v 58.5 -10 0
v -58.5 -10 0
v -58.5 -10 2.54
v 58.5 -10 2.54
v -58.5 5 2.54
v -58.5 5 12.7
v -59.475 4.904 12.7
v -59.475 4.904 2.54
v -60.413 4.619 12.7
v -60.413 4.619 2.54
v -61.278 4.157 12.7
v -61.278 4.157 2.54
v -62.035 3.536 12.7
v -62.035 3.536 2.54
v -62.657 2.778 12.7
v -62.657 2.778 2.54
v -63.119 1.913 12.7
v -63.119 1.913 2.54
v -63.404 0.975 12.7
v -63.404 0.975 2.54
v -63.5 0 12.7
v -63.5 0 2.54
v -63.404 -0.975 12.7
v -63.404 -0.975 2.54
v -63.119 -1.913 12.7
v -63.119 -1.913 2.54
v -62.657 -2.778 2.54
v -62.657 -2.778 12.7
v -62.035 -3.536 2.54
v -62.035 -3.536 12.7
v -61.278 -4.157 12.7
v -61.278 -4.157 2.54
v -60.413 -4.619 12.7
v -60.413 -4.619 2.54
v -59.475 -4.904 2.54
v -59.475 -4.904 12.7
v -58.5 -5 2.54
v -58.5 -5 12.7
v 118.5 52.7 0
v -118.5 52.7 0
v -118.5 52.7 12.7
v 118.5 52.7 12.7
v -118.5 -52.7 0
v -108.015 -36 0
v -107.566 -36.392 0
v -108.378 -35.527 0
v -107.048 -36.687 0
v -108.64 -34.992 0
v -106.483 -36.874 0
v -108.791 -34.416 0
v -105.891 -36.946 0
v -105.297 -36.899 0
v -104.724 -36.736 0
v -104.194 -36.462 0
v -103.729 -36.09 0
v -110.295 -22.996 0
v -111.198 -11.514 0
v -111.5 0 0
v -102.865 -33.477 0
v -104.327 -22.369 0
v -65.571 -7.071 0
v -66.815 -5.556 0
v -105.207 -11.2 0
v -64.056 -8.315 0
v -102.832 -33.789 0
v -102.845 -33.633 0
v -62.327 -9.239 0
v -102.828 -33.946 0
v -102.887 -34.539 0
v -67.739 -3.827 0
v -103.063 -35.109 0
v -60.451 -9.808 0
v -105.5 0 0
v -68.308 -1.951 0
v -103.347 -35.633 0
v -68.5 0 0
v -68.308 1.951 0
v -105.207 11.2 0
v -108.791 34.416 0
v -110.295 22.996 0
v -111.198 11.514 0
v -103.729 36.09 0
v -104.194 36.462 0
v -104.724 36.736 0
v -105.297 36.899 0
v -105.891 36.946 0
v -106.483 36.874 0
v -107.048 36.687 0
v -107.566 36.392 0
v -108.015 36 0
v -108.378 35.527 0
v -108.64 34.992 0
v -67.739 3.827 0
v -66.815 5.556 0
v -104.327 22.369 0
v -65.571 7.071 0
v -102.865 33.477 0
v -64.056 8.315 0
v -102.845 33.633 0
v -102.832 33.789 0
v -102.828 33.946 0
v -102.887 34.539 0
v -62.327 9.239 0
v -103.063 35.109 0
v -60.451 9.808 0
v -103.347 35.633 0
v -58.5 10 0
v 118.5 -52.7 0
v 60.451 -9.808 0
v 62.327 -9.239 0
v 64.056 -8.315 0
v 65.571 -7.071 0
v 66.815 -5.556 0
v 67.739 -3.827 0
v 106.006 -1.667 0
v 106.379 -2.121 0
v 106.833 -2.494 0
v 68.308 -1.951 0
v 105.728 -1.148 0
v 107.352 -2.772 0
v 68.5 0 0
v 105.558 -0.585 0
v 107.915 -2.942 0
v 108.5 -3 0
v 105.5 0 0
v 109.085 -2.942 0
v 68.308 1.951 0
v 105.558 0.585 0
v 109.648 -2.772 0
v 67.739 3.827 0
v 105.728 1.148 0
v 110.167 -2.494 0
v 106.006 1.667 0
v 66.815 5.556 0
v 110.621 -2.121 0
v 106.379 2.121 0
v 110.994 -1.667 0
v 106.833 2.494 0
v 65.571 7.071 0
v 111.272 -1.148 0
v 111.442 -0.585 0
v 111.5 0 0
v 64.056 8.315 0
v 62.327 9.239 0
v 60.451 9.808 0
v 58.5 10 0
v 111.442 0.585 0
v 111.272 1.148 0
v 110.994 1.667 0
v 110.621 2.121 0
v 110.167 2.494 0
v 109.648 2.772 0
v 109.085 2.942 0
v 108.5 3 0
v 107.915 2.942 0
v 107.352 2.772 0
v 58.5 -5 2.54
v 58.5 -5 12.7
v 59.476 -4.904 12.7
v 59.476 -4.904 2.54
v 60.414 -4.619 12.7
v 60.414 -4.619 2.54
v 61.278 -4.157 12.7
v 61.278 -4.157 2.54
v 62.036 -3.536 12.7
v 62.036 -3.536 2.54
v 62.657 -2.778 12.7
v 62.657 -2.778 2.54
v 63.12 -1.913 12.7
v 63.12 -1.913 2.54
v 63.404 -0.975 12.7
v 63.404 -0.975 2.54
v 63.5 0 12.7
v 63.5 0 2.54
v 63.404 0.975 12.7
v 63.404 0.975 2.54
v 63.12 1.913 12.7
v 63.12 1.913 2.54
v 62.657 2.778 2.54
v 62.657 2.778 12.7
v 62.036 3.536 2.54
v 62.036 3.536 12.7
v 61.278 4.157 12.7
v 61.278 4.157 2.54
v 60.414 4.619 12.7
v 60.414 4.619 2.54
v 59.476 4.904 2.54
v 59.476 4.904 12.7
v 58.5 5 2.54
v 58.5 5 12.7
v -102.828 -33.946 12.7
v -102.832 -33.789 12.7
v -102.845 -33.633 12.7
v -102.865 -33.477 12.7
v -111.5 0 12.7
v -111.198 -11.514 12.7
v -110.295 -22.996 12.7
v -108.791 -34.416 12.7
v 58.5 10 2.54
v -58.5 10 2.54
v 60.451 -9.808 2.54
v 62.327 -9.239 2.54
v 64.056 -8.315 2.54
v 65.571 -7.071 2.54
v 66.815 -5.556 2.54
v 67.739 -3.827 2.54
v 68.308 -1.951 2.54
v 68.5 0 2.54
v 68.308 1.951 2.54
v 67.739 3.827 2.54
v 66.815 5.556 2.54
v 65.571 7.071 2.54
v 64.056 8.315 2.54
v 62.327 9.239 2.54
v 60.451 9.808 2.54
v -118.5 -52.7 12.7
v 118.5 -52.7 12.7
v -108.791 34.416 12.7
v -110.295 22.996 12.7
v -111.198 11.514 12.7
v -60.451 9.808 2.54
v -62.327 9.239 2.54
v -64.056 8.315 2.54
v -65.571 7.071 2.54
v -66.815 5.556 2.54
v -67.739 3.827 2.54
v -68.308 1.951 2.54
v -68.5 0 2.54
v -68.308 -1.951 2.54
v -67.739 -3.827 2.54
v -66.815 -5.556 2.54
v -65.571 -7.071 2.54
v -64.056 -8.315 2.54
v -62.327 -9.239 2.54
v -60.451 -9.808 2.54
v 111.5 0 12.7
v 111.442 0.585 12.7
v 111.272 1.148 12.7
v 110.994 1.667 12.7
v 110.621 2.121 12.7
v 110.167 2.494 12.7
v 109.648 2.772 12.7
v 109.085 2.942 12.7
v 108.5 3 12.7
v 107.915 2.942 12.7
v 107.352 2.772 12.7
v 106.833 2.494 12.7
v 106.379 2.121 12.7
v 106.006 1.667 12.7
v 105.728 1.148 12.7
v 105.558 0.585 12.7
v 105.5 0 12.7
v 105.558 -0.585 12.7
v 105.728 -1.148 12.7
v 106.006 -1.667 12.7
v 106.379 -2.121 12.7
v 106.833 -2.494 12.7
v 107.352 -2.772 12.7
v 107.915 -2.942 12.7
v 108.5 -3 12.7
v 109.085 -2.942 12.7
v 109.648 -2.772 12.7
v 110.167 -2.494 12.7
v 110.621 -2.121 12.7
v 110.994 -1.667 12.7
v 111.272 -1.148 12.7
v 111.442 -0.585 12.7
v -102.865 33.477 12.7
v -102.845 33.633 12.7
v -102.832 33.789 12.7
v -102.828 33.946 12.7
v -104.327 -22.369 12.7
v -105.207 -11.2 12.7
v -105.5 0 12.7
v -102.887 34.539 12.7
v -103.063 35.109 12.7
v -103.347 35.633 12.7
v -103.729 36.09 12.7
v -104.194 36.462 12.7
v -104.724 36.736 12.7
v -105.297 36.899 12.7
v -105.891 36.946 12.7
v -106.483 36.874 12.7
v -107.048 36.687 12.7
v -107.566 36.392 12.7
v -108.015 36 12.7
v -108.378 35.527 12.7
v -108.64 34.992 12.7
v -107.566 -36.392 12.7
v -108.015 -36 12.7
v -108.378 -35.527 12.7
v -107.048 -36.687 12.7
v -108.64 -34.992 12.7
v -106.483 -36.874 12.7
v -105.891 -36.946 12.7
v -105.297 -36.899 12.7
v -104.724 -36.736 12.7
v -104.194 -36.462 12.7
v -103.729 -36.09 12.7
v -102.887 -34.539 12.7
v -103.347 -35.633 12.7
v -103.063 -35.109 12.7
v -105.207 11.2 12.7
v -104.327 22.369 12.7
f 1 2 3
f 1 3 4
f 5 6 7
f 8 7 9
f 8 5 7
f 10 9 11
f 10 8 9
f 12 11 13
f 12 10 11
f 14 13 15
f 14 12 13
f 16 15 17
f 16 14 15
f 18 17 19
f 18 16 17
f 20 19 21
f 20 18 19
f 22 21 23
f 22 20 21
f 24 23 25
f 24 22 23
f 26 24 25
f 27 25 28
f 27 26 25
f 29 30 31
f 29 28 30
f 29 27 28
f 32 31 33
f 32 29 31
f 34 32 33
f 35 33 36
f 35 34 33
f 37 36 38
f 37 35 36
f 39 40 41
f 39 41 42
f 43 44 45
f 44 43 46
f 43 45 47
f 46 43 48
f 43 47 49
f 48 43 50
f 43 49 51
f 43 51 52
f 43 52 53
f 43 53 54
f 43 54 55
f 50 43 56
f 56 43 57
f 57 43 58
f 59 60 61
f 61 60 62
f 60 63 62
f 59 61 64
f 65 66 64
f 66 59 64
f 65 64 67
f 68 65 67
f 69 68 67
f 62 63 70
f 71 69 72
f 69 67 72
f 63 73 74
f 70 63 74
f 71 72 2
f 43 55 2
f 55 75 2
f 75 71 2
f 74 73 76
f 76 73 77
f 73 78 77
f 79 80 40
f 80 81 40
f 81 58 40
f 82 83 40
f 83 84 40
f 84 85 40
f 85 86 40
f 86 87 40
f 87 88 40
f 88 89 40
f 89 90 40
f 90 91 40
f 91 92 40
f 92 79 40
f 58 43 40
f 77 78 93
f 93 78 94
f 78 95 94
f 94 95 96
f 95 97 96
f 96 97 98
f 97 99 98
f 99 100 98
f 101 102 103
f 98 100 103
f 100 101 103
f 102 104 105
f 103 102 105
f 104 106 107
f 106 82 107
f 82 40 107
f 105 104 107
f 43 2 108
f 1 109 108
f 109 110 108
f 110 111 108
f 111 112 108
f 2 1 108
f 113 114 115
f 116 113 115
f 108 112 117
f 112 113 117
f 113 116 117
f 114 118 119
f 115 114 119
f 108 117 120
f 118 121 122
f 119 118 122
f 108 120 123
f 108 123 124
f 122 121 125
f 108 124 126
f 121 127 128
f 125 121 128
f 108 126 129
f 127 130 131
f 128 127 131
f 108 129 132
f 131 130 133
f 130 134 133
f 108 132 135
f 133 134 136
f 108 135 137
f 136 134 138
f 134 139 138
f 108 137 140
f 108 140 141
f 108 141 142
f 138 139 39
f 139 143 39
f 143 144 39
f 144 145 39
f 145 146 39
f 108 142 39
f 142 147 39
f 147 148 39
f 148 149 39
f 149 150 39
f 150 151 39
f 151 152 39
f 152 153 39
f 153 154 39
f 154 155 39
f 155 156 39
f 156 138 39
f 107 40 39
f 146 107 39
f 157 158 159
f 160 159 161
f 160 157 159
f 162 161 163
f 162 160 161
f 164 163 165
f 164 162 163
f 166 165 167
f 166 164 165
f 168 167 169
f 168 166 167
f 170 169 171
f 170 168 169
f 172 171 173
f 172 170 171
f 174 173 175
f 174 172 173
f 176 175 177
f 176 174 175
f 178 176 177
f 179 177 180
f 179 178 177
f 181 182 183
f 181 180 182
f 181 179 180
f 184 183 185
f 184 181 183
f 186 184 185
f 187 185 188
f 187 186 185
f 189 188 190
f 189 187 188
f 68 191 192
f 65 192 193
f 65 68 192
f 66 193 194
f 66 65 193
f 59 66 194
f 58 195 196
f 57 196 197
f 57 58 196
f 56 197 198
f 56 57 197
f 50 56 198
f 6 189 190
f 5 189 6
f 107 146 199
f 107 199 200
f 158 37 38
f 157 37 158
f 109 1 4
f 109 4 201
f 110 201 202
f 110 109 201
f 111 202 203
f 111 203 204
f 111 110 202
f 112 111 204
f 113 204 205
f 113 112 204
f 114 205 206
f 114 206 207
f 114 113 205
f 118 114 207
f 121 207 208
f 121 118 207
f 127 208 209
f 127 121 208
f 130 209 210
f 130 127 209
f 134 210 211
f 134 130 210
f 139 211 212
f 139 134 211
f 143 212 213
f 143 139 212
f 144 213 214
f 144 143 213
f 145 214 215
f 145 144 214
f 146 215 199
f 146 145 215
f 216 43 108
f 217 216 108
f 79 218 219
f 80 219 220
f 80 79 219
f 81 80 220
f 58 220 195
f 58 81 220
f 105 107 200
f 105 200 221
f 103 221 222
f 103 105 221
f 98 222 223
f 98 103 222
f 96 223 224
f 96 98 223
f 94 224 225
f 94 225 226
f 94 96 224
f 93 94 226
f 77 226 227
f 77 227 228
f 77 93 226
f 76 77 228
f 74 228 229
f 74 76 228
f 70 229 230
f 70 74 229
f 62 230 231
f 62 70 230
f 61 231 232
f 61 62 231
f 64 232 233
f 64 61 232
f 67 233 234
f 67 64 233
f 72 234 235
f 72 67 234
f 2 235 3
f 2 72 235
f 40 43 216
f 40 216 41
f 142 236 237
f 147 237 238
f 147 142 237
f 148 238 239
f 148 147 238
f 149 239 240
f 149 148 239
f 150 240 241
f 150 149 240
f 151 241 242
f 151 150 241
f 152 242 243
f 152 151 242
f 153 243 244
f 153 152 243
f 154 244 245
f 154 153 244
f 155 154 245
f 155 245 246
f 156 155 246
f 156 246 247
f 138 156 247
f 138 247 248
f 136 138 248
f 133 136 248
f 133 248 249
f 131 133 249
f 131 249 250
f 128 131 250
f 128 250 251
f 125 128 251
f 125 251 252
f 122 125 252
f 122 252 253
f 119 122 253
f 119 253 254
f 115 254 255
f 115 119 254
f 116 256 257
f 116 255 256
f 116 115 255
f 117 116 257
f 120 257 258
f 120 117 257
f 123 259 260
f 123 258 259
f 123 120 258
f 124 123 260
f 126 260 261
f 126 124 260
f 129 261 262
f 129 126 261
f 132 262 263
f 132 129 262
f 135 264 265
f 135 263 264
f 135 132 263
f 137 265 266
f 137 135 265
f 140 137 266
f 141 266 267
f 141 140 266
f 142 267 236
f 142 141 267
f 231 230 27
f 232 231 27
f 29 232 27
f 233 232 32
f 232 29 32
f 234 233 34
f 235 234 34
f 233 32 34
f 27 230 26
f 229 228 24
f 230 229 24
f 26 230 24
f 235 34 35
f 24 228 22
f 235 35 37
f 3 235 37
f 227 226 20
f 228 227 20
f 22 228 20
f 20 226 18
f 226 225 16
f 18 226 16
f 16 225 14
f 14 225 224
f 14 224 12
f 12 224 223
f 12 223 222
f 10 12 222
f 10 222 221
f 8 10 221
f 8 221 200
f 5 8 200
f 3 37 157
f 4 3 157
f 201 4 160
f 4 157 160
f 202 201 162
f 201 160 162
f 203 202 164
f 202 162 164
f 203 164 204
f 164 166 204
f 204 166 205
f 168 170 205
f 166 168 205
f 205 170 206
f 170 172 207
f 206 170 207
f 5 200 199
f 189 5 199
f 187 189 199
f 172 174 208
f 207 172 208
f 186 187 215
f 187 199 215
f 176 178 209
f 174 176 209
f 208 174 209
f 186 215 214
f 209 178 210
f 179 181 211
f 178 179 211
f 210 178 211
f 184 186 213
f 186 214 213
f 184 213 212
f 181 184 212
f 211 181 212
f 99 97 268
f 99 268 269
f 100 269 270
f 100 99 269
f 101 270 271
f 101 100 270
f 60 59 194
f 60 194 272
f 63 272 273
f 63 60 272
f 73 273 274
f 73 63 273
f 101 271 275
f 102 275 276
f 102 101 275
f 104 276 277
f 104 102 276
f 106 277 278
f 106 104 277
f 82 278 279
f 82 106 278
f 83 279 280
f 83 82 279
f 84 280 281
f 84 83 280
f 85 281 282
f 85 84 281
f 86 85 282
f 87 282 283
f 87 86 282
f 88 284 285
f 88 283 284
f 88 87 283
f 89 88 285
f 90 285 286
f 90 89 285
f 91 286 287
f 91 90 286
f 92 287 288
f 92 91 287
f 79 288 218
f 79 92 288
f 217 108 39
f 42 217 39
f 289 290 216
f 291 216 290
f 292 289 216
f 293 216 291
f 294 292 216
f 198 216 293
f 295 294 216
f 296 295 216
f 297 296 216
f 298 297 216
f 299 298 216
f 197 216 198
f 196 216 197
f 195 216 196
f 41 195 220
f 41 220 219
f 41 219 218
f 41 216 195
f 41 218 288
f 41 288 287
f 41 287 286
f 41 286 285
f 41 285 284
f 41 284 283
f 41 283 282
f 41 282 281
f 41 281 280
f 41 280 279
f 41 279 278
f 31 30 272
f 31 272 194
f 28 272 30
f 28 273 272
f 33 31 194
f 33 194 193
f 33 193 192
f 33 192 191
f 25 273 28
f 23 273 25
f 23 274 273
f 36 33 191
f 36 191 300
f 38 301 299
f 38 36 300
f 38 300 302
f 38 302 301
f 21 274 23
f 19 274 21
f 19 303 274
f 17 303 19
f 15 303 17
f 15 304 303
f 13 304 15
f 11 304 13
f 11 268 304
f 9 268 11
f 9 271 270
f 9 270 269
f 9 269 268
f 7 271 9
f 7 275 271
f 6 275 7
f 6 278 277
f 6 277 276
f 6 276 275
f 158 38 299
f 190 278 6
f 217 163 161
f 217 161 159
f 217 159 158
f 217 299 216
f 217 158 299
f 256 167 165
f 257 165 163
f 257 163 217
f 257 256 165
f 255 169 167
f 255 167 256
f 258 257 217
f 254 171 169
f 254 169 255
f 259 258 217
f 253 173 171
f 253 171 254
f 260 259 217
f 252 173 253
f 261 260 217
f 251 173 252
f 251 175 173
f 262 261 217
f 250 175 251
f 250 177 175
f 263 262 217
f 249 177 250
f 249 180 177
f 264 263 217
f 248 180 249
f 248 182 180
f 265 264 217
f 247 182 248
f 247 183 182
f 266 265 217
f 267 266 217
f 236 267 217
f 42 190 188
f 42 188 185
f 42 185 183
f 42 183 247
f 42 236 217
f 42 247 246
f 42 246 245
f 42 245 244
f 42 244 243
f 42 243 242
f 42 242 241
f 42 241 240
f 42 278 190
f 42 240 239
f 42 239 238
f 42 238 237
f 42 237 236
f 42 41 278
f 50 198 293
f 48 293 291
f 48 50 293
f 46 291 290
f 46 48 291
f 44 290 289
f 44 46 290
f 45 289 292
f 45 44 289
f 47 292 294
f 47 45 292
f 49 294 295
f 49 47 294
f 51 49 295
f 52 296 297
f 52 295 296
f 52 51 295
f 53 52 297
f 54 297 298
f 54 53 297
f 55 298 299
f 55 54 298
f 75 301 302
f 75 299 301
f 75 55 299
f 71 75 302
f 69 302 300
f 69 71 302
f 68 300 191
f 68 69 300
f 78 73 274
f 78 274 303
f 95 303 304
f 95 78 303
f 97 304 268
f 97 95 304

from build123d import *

# Parameters (mm, degrees)
F0_W     = 236.99978
F0_H     = 105.4
F1_DEPTH = 12.7
F2_R     = 3
F3_DEPTH = 12.701
F4_DEPTH = 2.54


with BuildPart() as f1:
    # F0 (on Top) → F1 (new body)
    with BuildSketch(Plane.XY):
        with Locations((0.00011, 0)):
            Rectangle(F0_W, F0_H)
    extrude(amount=F1_DEPTH)

    # F2 (on Top) → F3 (cut, through all)
    with BuildSketch(Plane.XY):
        with BuildLine():
            Line((0, 5), (-58.49989, 5))
            ThreePointArc((-58.49989, 5), (-63.49989, 0), (-58.49989, -5))
            Line((-58.49989, -5), (0, -5))
            Line((0, -5), (58.50011, -5))
            ThreePointArc((58.50011, -5), (63.50011, 0), (58.50011, 5))
            Line((58.50011, 5), (0, 5))
        make_face()
        with BuildLine():
            ThreePointArc((-108.791217, 34.415555), (-106.297456, 30.983186), (-102.865087, 33.476947))
            ThreePointArc((-102.865087, 33.476947), (-102.8374, 33.710873), (-102.828152, 33.946251))
            ThreePointArc((-102.828152, 33.946251), (-105.592775, 36.937003), (-108.791217, 34.415555))
        make_face()
        with BuildLine():
            ThreePointArc((-102.865087, -33.476947), (-104.84009, -16.790232), (-105.49978, 0))
            ThreePointArc((-105.49978, 0), (-104.84009, 16.790232), (-102.865087, 33.476947))
            ThreePointArc((-102.865087, 33.476947), (-106.297456, 30.983186), (-108.791217, 34.415555))
            ThreePointArc((-108.791217, 34.415555), (-110.821594, 17.260987), (-111.49978, 0))
            ThreePointArc((-111.49978, 0), (-110.821594, -17.260987), (-108.791217, -34.415554))
            ThreePointArc((-108.791217, -34.415554), (-106.297456, -30.983186), (-102.865087, -33.476947))
        make_face()
        with BuildLine():
            ThreePointArc((-102.828152, -33.946251), (-102.8374, -33.710873), (-102.865087, -33.476947))
            ThreePointArc((-102.865087, -33.476947), (-106.297456, -30.983186), (-108.791217, -34.415554))
            ThreePointArc((-108.791217, -34.415554), (-105.592775, -36.937003), (-102.828152, -33.946251))
        make_face()
        with Locations((108.50004, 0)):
            Circle(F2_R)
    extrude(amount=F3_DEPTH, mode=Mode.SUBTRACT)

    # F2 (on Top) → F4 (cut)
    with BuildSketch(Plane.XY):
        with BuildLine():
            Line((0, 10), (-58.49989, 10))
            ThreePointArc((-58.49989, 10), (-68.49989, 0), (-58.49989, -10))
            Line((-58.49989, -10), (0, -10))
            Line((0, -10), (58.50011, -10))
            ThreePointArc((58.50011, -10), (68.50011, 0), (58.50011, 10))
            Line((58.50011, 10), (0, 10))
        make_face()
        with BuildLine():
            ThreePointArc((-58.49989, -5), (-63.49989, 0), (-58.49989, 5))
            Line((-58.49989, 5), (0, 5))
            Line((0, 5), (58.50011, 5))
            ThreePointArc((58.50011, 5), (63.50011, 0), (58.50011, -5))
            Line((58.50011, -5), (0, -5))
            Line((0, -5), (-58.49989, -5))
        make_face(mode=Mode.SUBTRACT)
    extrude(amount=F4_DEPTH, mode=Mode.SUBTRACT)


solid = f1.part
